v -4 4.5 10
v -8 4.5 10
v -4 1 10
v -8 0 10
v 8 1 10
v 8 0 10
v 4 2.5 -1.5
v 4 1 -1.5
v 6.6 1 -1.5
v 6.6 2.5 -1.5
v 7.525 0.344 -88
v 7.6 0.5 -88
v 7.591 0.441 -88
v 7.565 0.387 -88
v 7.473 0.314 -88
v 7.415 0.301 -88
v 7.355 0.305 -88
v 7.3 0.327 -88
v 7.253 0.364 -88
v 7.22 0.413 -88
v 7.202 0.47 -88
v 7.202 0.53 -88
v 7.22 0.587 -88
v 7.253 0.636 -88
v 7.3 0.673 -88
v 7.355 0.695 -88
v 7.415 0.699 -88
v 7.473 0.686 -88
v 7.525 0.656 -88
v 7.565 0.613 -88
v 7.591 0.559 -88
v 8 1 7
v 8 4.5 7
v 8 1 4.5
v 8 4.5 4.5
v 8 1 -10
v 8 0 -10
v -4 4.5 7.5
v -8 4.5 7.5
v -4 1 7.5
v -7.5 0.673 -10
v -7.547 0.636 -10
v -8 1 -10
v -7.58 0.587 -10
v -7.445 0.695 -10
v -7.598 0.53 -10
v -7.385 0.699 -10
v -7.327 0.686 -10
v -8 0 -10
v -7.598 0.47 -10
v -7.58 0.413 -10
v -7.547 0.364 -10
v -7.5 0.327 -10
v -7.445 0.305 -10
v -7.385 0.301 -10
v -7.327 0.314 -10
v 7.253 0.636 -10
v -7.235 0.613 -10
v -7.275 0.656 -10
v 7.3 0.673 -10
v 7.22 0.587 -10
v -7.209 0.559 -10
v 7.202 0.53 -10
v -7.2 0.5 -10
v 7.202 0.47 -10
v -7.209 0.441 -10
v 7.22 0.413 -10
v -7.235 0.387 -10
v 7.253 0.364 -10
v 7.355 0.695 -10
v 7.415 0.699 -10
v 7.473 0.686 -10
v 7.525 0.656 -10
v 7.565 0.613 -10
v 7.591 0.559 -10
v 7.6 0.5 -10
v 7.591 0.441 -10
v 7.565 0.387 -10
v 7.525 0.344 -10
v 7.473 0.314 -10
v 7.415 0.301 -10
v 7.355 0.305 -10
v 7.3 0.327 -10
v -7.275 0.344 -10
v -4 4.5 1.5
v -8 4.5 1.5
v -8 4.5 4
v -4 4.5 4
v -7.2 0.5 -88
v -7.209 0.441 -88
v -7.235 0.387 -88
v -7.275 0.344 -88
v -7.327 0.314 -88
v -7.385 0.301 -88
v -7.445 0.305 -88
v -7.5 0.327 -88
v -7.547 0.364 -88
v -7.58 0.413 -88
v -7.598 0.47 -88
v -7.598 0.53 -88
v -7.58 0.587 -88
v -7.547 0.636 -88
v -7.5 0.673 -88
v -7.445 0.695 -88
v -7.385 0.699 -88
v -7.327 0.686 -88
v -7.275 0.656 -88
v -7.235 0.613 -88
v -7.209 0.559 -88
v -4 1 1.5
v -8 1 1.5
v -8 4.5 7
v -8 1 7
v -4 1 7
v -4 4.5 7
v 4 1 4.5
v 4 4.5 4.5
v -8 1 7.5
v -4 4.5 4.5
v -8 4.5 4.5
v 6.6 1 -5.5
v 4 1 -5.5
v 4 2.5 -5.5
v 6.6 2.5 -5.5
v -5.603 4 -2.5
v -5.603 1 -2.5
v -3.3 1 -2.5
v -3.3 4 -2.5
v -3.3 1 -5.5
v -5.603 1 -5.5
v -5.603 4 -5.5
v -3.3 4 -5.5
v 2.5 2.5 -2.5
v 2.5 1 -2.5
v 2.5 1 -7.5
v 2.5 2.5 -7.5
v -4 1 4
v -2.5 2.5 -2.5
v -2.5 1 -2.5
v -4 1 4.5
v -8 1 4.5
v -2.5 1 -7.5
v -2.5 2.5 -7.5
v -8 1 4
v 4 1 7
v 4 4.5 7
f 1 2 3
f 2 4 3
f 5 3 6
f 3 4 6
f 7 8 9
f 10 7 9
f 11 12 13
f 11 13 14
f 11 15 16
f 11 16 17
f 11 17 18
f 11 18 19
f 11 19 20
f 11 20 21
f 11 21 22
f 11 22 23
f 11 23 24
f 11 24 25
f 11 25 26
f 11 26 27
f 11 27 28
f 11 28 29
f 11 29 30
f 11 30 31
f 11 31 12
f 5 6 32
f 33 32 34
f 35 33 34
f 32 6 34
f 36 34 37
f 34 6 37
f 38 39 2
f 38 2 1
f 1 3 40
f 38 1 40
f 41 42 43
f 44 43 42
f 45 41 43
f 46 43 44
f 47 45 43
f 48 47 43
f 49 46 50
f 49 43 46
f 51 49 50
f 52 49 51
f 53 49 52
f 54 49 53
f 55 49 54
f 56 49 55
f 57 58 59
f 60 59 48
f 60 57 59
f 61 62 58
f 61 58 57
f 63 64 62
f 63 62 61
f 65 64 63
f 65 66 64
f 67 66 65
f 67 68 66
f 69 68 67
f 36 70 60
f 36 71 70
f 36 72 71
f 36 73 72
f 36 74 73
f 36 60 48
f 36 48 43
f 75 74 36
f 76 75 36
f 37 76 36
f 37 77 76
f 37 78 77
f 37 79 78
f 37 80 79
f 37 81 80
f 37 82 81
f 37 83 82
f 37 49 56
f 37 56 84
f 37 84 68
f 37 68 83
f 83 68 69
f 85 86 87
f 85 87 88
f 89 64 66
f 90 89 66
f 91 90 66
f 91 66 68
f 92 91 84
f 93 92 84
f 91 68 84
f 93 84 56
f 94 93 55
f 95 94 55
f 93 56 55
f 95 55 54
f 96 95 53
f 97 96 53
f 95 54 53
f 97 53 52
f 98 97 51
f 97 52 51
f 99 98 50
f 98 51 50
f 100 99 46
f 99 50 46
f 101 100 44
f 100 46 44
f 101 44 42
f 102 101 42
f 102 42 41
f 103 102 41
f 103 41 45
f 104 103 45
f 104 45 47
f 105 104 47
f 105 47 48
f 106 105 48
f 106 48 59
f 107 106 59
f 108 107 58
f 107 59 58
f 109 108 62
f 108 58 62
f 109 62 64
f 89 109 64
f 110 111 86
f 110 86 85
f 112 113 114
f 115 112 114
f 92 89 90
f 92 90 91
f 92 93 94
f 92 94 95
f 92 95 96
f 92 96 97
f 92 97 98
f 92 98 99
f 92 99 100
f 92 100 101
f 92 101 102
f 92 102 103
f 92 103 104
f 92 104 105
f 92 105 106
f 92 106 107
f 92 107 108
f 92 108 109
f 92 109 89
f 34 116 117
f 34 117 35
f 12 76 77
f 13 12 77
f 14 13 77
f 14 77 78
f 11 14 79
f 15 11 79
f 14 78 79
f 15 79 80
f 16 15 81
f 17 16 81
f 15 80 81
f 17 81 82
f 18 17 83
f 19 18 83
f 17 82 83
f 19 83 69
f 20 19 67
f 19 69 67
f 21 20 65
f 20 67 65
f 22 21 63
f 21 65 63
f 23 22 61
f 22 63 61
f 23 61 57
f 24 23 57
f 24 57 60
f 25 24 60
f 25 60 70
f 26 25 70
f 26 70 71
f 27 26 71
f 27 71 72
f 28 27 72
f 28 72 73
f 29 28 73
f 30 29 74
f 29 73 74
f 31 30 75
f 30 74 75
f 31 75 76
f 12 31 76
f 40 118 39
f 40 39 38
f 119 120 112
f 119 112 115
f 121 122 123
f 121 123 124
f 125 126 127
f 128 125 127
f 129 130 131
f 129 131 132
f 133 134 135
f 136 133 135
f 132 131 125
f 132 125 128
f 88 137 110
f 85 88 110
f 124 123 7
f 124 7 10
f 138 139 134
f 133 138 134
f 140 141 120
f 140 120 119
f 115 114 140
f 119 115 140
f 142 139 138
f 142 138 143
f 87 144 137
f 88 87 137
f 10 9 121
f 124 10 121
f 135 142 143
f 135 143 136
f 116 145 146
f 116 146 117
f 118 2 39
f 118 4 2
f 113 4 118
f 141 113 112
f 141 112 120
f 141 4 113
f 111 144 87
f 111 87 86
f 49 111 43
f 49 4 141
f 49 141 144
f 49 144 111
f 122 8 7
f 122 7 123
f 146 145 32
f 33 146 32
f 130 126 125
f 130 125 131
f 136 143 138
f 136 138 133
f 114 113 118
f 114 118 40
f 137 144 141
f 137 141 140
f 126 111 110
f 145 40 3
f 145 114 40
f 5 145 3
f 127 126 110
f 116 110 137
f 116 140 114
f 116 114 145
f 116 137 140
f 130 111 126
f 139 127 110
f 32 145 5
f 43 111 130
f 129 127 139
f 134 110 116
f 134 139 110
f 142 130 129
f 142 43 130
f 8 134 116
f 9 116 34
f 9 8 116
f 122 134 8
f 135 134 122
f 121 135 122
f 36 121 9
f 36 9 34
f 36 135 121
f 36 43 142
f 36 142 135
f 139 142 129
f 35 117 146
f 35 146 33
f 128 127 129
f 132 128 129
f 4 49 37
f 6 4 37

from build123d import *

# Parameters (mm, degrees)
SKETCH1_W           = 16
SKETCH1_H           = 20
BOSS_EXTRUDE1_DEPTH = 1
SKETCH2_W           = 4
SKETCH2_H           = 2.5
BOSS_EXTRUDE2_DEPTH = 3.5
SKETCH3_W           = 5
SKETCH3_H           = 5
SKETCH3_W_2         = 2.6
SKETCH3_H_2         = 4
BOSS_EXTRUDE3_DEPTH = 1.5
SKETCH4_W           = 2.302574488
SKETCH4_H           = 3
BOSS_EXTRUDE4_DEPTH = 3
SKETCH5_R           = 0.2
BOSS_EXTRUDE5_DEPTH = 78


with BuildPart() as part:
    # Sketch1 → Boss-Extrude1 (new body)
    with BuildSketch(Plane(origin=(0, 0, 0), x_dir=(1, 0, 0), z_dir=(0, 1, 0))):
        Rectangle(SKETCH1_W, SKETCH1_H)
    extrude(amount=BOSS_EXTRUDE1_DEPTH)

    # Sketch2 → Boss-Extrude2 (add)
    with BuildSketch(Plane(origin=(0, 1, 0), x_dir=(1, 0, 0), z_dir=(0, 1, 0))):
        with Locations((-6, -5.75)):
            Rectangle(SKETCH2_W, SKETCH2_H)
        with Locations((-6, -8.75)):
            Rectangle(SKETCH2_W, SKETCH2_H)
        with Locations((-6, -2.75)):
            Rectangle(SKETCH2_W, SKETCH2_H)
        with Locations((6, -5.75)):
            Rectangle(SKETCH2_W, SKETCH2_H)
    extrude(amount=BOSS_EXTRUDE2_DEPTH)

    # Sketch3 → Boss-Extrude3 (add)
    with BuildSketch(Plane(origin=(0, 1, 0), x_dir=(1, 0, 0), z_dir=(0, 1, 0))):
        with Locations((0, 5)):
            Rectangle(SKETCH3_W, SKETCH3_H)
        with Locations((5.3, 3.5)):
            Rectangle(SKETCH3_W_2, SKETCH3_H_2)
    extrude(amount=BOSS_EXTRUDE3_DEPTH)

    # Sketch4 → Boss-Extrude4 (add)
    with BuildSketch(Plane(origin=(0, 1, 0), x_dir=(1, 0, 0), z_dir=(0, 1, 0))):
        with Locations((-4.451287244, 4)):
            Rectangle(SKETCH4_W, SKETCH4_H)
    extrude(amount=BOSS_EXTRUDE4_DEPTH)

    # Sketch5 → Boss-Extrude5 (add)
    with BuildSketch(Plane(origin=(0, 0, -10), x_dir=(-1, 0, 0), z_dir=(0, 0, -1))):
        with Locations(Location((7.4, 0.5, 0), (0, 0, 180))):
            Circle(SKETCH5_R)
        with Locations(Location((-7.4, 0.5, 0), (0, 0, 180))):
            Circle(SKETCH5_R)
    extrude(amount=BOSS_EXTRUDE5_DEPTH)


solid = part.part
